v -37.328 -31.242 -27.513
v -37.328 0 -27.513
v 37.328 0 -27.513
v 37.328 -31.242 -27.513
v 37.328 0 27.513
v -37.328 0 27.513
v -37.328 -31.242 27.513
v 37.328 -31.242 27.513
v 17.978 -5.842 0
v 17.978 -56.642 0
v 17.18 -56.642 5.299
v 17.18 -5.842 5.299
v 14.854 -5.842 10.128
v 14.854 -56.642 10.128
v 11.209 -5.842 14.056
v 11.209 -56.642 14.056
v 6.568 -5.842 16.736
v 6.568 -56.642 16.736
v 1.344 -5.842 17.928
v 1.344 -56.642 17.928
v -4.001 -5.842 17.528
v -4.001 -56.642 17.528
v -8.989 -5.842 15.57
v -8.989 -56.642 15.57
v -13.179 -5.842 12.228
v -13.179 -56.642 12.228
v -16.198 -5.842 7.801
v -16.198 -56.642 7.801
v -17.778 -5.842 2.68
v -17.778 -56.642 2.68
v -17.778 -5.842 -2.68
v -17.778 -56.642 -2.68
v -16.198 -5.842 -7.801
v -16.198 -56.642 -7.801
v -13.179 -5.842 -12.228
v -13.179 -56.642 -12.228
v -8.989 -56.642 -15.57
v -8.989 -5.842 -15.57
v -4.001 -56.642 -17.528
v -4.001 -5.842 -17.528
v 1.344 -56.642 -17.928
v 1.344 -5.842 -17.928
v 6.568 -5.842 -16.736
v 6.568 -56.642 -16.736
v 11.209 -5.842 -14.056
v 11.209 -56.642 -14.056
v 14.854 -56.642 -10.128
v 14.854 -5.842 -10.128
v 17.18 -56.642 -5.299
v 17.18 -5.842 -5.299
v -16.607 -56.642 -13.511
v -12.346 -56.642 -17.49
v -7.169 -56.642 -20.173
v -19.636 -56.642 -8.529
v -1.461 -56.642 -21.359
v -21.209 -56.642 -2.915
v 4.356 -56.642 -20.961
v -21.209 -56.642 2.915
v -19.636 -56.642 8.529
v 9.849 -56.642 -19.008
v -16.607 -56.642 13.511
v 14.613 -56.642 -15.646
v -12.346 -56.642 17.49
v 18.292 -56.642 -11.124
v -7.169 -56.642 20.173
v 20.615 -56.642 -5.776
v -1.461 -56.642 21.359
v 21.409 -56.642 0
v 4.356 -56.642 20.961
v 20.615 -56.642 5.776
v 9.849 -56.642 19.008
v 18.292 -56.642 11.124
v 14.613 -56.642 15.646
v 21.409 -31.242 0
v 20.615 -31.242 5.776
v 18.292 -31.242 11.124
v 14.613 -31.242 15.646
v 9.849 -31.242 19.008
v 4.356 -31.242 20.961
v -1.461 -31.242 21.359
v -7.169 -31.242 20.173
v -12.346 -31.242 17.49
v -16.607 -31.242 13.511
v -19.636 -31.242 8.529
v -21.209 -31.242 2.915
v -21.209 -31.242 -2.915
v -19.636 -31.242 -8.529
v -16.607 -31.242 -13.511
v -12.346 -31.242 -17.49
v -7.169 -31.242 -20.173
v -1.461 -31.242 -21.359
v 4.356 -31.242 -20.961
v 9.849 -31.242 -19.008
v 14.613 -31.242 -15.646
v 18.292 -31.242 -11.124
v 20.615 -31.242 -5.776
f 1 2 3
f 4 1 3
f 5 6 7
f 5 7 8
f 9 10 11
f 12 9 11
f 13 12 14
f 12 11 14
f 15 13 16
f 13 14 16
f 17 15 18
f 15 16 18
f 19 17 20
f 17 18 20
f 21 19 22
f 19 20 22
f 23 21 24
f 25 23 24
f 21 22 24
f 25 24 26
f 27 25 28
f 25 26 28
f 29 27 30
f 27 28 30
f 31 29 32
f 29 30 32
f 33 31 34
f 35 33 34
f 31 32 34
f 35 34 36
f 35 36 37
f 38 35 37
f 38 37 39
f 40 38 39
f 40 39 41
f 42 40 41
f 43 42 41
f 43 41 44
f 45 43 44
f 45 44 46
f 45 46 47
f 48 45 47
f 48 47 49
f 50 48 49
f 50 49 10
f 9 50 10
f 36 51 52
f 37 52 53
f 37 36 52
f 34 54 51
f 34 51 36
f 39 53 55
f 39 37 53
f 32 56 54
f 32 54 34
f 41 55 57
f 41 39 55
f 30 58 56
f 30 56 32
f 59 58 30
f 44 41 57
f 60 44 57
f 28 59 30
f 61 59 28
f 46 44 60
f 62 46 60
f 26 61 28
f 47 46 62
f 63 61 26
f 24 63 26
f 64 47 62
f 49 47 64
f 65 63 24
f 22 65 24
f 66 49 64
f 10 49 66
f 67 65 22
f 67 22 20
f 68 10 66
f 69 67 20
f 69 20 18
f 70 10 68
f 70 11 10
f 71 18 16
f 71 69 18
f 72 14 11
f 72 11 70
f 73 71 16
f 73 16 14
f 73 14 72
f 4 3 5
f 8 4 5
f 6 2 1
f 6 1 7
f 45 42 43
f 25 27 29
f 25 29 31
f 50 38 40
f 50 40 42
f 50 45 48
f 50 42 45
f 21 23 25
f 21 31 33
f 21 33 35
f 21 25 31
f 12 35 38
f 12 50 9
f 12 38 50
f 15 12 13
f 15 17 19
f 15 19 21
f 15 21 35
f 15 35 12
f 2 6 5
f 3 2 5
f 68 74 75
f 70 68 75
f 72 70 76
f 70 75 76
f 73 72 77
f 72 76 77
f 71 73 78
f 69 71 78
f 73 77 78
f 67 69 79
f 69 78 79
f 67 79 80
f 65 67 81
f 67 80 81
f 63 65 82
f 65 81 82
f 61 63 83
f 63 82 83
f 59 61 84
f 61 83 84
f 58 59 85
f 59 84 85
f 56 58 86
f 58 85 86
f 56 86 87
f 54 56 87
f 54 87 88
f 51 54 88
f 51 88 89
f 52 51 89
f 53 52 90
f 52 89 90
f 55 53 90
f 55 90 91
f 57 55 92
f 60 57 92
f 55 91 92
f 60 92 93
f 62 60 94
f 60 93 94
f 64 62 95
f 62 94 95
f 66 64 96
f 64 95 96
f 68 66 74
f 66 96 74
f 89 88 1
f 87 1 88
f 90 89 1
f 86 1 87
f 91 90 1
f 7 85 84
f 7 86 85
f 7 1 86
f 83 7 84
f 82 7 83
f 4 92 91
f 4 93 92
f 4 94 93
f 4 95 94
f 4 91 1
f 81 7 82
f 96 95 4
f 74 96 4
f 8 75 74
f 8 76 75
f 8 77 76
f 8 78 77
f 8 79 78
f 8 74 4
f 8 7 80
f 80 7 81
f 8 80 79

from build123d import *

# Parameters (mm, degrees)
F0_W      = 74.656174
F0_H      = 55.025466
F1_DEPTH  = 31.242
F2_R      = 21.408714
F3_DEPTH  = 25.4
F4_R      = 17.978336
F5_DEPTH  = 25.4
F5_FACE_R = 17.978336
F6_DEPTH  = 25.4


with BuildPart() as f1:
    # F0 (on Front) → F1 (new body)
    with BuildSketch(Plane.XZ):
        Rectangle(F0_W, F0_H)
    extrude(amount=F1_DEPTH)

    # F2 (on face) → F3 (join)
    with BuildSketch(Plane.XZ.offset(31.242)):
        Circle(F2_R)
    extrude(amount=F3_DEPTH)

    # F4 (on face) → F5 (cut)
    with BuildSketch(Plane.XZ.offset(56.642)):
        Circle(F4_R)
    extrude(amount=-F5_DEPTH, mode=Mode.SUBTRACT)

    # F5_face (on face) → F6 (cut)
    with BuildSketch(Plane.XZ.offset(31.242)):
        Circle(F5_FACE_R)
    extrude(amount=-F6_DEPTH, mode=Mode.SUBTRACT)


solid = f1.part
